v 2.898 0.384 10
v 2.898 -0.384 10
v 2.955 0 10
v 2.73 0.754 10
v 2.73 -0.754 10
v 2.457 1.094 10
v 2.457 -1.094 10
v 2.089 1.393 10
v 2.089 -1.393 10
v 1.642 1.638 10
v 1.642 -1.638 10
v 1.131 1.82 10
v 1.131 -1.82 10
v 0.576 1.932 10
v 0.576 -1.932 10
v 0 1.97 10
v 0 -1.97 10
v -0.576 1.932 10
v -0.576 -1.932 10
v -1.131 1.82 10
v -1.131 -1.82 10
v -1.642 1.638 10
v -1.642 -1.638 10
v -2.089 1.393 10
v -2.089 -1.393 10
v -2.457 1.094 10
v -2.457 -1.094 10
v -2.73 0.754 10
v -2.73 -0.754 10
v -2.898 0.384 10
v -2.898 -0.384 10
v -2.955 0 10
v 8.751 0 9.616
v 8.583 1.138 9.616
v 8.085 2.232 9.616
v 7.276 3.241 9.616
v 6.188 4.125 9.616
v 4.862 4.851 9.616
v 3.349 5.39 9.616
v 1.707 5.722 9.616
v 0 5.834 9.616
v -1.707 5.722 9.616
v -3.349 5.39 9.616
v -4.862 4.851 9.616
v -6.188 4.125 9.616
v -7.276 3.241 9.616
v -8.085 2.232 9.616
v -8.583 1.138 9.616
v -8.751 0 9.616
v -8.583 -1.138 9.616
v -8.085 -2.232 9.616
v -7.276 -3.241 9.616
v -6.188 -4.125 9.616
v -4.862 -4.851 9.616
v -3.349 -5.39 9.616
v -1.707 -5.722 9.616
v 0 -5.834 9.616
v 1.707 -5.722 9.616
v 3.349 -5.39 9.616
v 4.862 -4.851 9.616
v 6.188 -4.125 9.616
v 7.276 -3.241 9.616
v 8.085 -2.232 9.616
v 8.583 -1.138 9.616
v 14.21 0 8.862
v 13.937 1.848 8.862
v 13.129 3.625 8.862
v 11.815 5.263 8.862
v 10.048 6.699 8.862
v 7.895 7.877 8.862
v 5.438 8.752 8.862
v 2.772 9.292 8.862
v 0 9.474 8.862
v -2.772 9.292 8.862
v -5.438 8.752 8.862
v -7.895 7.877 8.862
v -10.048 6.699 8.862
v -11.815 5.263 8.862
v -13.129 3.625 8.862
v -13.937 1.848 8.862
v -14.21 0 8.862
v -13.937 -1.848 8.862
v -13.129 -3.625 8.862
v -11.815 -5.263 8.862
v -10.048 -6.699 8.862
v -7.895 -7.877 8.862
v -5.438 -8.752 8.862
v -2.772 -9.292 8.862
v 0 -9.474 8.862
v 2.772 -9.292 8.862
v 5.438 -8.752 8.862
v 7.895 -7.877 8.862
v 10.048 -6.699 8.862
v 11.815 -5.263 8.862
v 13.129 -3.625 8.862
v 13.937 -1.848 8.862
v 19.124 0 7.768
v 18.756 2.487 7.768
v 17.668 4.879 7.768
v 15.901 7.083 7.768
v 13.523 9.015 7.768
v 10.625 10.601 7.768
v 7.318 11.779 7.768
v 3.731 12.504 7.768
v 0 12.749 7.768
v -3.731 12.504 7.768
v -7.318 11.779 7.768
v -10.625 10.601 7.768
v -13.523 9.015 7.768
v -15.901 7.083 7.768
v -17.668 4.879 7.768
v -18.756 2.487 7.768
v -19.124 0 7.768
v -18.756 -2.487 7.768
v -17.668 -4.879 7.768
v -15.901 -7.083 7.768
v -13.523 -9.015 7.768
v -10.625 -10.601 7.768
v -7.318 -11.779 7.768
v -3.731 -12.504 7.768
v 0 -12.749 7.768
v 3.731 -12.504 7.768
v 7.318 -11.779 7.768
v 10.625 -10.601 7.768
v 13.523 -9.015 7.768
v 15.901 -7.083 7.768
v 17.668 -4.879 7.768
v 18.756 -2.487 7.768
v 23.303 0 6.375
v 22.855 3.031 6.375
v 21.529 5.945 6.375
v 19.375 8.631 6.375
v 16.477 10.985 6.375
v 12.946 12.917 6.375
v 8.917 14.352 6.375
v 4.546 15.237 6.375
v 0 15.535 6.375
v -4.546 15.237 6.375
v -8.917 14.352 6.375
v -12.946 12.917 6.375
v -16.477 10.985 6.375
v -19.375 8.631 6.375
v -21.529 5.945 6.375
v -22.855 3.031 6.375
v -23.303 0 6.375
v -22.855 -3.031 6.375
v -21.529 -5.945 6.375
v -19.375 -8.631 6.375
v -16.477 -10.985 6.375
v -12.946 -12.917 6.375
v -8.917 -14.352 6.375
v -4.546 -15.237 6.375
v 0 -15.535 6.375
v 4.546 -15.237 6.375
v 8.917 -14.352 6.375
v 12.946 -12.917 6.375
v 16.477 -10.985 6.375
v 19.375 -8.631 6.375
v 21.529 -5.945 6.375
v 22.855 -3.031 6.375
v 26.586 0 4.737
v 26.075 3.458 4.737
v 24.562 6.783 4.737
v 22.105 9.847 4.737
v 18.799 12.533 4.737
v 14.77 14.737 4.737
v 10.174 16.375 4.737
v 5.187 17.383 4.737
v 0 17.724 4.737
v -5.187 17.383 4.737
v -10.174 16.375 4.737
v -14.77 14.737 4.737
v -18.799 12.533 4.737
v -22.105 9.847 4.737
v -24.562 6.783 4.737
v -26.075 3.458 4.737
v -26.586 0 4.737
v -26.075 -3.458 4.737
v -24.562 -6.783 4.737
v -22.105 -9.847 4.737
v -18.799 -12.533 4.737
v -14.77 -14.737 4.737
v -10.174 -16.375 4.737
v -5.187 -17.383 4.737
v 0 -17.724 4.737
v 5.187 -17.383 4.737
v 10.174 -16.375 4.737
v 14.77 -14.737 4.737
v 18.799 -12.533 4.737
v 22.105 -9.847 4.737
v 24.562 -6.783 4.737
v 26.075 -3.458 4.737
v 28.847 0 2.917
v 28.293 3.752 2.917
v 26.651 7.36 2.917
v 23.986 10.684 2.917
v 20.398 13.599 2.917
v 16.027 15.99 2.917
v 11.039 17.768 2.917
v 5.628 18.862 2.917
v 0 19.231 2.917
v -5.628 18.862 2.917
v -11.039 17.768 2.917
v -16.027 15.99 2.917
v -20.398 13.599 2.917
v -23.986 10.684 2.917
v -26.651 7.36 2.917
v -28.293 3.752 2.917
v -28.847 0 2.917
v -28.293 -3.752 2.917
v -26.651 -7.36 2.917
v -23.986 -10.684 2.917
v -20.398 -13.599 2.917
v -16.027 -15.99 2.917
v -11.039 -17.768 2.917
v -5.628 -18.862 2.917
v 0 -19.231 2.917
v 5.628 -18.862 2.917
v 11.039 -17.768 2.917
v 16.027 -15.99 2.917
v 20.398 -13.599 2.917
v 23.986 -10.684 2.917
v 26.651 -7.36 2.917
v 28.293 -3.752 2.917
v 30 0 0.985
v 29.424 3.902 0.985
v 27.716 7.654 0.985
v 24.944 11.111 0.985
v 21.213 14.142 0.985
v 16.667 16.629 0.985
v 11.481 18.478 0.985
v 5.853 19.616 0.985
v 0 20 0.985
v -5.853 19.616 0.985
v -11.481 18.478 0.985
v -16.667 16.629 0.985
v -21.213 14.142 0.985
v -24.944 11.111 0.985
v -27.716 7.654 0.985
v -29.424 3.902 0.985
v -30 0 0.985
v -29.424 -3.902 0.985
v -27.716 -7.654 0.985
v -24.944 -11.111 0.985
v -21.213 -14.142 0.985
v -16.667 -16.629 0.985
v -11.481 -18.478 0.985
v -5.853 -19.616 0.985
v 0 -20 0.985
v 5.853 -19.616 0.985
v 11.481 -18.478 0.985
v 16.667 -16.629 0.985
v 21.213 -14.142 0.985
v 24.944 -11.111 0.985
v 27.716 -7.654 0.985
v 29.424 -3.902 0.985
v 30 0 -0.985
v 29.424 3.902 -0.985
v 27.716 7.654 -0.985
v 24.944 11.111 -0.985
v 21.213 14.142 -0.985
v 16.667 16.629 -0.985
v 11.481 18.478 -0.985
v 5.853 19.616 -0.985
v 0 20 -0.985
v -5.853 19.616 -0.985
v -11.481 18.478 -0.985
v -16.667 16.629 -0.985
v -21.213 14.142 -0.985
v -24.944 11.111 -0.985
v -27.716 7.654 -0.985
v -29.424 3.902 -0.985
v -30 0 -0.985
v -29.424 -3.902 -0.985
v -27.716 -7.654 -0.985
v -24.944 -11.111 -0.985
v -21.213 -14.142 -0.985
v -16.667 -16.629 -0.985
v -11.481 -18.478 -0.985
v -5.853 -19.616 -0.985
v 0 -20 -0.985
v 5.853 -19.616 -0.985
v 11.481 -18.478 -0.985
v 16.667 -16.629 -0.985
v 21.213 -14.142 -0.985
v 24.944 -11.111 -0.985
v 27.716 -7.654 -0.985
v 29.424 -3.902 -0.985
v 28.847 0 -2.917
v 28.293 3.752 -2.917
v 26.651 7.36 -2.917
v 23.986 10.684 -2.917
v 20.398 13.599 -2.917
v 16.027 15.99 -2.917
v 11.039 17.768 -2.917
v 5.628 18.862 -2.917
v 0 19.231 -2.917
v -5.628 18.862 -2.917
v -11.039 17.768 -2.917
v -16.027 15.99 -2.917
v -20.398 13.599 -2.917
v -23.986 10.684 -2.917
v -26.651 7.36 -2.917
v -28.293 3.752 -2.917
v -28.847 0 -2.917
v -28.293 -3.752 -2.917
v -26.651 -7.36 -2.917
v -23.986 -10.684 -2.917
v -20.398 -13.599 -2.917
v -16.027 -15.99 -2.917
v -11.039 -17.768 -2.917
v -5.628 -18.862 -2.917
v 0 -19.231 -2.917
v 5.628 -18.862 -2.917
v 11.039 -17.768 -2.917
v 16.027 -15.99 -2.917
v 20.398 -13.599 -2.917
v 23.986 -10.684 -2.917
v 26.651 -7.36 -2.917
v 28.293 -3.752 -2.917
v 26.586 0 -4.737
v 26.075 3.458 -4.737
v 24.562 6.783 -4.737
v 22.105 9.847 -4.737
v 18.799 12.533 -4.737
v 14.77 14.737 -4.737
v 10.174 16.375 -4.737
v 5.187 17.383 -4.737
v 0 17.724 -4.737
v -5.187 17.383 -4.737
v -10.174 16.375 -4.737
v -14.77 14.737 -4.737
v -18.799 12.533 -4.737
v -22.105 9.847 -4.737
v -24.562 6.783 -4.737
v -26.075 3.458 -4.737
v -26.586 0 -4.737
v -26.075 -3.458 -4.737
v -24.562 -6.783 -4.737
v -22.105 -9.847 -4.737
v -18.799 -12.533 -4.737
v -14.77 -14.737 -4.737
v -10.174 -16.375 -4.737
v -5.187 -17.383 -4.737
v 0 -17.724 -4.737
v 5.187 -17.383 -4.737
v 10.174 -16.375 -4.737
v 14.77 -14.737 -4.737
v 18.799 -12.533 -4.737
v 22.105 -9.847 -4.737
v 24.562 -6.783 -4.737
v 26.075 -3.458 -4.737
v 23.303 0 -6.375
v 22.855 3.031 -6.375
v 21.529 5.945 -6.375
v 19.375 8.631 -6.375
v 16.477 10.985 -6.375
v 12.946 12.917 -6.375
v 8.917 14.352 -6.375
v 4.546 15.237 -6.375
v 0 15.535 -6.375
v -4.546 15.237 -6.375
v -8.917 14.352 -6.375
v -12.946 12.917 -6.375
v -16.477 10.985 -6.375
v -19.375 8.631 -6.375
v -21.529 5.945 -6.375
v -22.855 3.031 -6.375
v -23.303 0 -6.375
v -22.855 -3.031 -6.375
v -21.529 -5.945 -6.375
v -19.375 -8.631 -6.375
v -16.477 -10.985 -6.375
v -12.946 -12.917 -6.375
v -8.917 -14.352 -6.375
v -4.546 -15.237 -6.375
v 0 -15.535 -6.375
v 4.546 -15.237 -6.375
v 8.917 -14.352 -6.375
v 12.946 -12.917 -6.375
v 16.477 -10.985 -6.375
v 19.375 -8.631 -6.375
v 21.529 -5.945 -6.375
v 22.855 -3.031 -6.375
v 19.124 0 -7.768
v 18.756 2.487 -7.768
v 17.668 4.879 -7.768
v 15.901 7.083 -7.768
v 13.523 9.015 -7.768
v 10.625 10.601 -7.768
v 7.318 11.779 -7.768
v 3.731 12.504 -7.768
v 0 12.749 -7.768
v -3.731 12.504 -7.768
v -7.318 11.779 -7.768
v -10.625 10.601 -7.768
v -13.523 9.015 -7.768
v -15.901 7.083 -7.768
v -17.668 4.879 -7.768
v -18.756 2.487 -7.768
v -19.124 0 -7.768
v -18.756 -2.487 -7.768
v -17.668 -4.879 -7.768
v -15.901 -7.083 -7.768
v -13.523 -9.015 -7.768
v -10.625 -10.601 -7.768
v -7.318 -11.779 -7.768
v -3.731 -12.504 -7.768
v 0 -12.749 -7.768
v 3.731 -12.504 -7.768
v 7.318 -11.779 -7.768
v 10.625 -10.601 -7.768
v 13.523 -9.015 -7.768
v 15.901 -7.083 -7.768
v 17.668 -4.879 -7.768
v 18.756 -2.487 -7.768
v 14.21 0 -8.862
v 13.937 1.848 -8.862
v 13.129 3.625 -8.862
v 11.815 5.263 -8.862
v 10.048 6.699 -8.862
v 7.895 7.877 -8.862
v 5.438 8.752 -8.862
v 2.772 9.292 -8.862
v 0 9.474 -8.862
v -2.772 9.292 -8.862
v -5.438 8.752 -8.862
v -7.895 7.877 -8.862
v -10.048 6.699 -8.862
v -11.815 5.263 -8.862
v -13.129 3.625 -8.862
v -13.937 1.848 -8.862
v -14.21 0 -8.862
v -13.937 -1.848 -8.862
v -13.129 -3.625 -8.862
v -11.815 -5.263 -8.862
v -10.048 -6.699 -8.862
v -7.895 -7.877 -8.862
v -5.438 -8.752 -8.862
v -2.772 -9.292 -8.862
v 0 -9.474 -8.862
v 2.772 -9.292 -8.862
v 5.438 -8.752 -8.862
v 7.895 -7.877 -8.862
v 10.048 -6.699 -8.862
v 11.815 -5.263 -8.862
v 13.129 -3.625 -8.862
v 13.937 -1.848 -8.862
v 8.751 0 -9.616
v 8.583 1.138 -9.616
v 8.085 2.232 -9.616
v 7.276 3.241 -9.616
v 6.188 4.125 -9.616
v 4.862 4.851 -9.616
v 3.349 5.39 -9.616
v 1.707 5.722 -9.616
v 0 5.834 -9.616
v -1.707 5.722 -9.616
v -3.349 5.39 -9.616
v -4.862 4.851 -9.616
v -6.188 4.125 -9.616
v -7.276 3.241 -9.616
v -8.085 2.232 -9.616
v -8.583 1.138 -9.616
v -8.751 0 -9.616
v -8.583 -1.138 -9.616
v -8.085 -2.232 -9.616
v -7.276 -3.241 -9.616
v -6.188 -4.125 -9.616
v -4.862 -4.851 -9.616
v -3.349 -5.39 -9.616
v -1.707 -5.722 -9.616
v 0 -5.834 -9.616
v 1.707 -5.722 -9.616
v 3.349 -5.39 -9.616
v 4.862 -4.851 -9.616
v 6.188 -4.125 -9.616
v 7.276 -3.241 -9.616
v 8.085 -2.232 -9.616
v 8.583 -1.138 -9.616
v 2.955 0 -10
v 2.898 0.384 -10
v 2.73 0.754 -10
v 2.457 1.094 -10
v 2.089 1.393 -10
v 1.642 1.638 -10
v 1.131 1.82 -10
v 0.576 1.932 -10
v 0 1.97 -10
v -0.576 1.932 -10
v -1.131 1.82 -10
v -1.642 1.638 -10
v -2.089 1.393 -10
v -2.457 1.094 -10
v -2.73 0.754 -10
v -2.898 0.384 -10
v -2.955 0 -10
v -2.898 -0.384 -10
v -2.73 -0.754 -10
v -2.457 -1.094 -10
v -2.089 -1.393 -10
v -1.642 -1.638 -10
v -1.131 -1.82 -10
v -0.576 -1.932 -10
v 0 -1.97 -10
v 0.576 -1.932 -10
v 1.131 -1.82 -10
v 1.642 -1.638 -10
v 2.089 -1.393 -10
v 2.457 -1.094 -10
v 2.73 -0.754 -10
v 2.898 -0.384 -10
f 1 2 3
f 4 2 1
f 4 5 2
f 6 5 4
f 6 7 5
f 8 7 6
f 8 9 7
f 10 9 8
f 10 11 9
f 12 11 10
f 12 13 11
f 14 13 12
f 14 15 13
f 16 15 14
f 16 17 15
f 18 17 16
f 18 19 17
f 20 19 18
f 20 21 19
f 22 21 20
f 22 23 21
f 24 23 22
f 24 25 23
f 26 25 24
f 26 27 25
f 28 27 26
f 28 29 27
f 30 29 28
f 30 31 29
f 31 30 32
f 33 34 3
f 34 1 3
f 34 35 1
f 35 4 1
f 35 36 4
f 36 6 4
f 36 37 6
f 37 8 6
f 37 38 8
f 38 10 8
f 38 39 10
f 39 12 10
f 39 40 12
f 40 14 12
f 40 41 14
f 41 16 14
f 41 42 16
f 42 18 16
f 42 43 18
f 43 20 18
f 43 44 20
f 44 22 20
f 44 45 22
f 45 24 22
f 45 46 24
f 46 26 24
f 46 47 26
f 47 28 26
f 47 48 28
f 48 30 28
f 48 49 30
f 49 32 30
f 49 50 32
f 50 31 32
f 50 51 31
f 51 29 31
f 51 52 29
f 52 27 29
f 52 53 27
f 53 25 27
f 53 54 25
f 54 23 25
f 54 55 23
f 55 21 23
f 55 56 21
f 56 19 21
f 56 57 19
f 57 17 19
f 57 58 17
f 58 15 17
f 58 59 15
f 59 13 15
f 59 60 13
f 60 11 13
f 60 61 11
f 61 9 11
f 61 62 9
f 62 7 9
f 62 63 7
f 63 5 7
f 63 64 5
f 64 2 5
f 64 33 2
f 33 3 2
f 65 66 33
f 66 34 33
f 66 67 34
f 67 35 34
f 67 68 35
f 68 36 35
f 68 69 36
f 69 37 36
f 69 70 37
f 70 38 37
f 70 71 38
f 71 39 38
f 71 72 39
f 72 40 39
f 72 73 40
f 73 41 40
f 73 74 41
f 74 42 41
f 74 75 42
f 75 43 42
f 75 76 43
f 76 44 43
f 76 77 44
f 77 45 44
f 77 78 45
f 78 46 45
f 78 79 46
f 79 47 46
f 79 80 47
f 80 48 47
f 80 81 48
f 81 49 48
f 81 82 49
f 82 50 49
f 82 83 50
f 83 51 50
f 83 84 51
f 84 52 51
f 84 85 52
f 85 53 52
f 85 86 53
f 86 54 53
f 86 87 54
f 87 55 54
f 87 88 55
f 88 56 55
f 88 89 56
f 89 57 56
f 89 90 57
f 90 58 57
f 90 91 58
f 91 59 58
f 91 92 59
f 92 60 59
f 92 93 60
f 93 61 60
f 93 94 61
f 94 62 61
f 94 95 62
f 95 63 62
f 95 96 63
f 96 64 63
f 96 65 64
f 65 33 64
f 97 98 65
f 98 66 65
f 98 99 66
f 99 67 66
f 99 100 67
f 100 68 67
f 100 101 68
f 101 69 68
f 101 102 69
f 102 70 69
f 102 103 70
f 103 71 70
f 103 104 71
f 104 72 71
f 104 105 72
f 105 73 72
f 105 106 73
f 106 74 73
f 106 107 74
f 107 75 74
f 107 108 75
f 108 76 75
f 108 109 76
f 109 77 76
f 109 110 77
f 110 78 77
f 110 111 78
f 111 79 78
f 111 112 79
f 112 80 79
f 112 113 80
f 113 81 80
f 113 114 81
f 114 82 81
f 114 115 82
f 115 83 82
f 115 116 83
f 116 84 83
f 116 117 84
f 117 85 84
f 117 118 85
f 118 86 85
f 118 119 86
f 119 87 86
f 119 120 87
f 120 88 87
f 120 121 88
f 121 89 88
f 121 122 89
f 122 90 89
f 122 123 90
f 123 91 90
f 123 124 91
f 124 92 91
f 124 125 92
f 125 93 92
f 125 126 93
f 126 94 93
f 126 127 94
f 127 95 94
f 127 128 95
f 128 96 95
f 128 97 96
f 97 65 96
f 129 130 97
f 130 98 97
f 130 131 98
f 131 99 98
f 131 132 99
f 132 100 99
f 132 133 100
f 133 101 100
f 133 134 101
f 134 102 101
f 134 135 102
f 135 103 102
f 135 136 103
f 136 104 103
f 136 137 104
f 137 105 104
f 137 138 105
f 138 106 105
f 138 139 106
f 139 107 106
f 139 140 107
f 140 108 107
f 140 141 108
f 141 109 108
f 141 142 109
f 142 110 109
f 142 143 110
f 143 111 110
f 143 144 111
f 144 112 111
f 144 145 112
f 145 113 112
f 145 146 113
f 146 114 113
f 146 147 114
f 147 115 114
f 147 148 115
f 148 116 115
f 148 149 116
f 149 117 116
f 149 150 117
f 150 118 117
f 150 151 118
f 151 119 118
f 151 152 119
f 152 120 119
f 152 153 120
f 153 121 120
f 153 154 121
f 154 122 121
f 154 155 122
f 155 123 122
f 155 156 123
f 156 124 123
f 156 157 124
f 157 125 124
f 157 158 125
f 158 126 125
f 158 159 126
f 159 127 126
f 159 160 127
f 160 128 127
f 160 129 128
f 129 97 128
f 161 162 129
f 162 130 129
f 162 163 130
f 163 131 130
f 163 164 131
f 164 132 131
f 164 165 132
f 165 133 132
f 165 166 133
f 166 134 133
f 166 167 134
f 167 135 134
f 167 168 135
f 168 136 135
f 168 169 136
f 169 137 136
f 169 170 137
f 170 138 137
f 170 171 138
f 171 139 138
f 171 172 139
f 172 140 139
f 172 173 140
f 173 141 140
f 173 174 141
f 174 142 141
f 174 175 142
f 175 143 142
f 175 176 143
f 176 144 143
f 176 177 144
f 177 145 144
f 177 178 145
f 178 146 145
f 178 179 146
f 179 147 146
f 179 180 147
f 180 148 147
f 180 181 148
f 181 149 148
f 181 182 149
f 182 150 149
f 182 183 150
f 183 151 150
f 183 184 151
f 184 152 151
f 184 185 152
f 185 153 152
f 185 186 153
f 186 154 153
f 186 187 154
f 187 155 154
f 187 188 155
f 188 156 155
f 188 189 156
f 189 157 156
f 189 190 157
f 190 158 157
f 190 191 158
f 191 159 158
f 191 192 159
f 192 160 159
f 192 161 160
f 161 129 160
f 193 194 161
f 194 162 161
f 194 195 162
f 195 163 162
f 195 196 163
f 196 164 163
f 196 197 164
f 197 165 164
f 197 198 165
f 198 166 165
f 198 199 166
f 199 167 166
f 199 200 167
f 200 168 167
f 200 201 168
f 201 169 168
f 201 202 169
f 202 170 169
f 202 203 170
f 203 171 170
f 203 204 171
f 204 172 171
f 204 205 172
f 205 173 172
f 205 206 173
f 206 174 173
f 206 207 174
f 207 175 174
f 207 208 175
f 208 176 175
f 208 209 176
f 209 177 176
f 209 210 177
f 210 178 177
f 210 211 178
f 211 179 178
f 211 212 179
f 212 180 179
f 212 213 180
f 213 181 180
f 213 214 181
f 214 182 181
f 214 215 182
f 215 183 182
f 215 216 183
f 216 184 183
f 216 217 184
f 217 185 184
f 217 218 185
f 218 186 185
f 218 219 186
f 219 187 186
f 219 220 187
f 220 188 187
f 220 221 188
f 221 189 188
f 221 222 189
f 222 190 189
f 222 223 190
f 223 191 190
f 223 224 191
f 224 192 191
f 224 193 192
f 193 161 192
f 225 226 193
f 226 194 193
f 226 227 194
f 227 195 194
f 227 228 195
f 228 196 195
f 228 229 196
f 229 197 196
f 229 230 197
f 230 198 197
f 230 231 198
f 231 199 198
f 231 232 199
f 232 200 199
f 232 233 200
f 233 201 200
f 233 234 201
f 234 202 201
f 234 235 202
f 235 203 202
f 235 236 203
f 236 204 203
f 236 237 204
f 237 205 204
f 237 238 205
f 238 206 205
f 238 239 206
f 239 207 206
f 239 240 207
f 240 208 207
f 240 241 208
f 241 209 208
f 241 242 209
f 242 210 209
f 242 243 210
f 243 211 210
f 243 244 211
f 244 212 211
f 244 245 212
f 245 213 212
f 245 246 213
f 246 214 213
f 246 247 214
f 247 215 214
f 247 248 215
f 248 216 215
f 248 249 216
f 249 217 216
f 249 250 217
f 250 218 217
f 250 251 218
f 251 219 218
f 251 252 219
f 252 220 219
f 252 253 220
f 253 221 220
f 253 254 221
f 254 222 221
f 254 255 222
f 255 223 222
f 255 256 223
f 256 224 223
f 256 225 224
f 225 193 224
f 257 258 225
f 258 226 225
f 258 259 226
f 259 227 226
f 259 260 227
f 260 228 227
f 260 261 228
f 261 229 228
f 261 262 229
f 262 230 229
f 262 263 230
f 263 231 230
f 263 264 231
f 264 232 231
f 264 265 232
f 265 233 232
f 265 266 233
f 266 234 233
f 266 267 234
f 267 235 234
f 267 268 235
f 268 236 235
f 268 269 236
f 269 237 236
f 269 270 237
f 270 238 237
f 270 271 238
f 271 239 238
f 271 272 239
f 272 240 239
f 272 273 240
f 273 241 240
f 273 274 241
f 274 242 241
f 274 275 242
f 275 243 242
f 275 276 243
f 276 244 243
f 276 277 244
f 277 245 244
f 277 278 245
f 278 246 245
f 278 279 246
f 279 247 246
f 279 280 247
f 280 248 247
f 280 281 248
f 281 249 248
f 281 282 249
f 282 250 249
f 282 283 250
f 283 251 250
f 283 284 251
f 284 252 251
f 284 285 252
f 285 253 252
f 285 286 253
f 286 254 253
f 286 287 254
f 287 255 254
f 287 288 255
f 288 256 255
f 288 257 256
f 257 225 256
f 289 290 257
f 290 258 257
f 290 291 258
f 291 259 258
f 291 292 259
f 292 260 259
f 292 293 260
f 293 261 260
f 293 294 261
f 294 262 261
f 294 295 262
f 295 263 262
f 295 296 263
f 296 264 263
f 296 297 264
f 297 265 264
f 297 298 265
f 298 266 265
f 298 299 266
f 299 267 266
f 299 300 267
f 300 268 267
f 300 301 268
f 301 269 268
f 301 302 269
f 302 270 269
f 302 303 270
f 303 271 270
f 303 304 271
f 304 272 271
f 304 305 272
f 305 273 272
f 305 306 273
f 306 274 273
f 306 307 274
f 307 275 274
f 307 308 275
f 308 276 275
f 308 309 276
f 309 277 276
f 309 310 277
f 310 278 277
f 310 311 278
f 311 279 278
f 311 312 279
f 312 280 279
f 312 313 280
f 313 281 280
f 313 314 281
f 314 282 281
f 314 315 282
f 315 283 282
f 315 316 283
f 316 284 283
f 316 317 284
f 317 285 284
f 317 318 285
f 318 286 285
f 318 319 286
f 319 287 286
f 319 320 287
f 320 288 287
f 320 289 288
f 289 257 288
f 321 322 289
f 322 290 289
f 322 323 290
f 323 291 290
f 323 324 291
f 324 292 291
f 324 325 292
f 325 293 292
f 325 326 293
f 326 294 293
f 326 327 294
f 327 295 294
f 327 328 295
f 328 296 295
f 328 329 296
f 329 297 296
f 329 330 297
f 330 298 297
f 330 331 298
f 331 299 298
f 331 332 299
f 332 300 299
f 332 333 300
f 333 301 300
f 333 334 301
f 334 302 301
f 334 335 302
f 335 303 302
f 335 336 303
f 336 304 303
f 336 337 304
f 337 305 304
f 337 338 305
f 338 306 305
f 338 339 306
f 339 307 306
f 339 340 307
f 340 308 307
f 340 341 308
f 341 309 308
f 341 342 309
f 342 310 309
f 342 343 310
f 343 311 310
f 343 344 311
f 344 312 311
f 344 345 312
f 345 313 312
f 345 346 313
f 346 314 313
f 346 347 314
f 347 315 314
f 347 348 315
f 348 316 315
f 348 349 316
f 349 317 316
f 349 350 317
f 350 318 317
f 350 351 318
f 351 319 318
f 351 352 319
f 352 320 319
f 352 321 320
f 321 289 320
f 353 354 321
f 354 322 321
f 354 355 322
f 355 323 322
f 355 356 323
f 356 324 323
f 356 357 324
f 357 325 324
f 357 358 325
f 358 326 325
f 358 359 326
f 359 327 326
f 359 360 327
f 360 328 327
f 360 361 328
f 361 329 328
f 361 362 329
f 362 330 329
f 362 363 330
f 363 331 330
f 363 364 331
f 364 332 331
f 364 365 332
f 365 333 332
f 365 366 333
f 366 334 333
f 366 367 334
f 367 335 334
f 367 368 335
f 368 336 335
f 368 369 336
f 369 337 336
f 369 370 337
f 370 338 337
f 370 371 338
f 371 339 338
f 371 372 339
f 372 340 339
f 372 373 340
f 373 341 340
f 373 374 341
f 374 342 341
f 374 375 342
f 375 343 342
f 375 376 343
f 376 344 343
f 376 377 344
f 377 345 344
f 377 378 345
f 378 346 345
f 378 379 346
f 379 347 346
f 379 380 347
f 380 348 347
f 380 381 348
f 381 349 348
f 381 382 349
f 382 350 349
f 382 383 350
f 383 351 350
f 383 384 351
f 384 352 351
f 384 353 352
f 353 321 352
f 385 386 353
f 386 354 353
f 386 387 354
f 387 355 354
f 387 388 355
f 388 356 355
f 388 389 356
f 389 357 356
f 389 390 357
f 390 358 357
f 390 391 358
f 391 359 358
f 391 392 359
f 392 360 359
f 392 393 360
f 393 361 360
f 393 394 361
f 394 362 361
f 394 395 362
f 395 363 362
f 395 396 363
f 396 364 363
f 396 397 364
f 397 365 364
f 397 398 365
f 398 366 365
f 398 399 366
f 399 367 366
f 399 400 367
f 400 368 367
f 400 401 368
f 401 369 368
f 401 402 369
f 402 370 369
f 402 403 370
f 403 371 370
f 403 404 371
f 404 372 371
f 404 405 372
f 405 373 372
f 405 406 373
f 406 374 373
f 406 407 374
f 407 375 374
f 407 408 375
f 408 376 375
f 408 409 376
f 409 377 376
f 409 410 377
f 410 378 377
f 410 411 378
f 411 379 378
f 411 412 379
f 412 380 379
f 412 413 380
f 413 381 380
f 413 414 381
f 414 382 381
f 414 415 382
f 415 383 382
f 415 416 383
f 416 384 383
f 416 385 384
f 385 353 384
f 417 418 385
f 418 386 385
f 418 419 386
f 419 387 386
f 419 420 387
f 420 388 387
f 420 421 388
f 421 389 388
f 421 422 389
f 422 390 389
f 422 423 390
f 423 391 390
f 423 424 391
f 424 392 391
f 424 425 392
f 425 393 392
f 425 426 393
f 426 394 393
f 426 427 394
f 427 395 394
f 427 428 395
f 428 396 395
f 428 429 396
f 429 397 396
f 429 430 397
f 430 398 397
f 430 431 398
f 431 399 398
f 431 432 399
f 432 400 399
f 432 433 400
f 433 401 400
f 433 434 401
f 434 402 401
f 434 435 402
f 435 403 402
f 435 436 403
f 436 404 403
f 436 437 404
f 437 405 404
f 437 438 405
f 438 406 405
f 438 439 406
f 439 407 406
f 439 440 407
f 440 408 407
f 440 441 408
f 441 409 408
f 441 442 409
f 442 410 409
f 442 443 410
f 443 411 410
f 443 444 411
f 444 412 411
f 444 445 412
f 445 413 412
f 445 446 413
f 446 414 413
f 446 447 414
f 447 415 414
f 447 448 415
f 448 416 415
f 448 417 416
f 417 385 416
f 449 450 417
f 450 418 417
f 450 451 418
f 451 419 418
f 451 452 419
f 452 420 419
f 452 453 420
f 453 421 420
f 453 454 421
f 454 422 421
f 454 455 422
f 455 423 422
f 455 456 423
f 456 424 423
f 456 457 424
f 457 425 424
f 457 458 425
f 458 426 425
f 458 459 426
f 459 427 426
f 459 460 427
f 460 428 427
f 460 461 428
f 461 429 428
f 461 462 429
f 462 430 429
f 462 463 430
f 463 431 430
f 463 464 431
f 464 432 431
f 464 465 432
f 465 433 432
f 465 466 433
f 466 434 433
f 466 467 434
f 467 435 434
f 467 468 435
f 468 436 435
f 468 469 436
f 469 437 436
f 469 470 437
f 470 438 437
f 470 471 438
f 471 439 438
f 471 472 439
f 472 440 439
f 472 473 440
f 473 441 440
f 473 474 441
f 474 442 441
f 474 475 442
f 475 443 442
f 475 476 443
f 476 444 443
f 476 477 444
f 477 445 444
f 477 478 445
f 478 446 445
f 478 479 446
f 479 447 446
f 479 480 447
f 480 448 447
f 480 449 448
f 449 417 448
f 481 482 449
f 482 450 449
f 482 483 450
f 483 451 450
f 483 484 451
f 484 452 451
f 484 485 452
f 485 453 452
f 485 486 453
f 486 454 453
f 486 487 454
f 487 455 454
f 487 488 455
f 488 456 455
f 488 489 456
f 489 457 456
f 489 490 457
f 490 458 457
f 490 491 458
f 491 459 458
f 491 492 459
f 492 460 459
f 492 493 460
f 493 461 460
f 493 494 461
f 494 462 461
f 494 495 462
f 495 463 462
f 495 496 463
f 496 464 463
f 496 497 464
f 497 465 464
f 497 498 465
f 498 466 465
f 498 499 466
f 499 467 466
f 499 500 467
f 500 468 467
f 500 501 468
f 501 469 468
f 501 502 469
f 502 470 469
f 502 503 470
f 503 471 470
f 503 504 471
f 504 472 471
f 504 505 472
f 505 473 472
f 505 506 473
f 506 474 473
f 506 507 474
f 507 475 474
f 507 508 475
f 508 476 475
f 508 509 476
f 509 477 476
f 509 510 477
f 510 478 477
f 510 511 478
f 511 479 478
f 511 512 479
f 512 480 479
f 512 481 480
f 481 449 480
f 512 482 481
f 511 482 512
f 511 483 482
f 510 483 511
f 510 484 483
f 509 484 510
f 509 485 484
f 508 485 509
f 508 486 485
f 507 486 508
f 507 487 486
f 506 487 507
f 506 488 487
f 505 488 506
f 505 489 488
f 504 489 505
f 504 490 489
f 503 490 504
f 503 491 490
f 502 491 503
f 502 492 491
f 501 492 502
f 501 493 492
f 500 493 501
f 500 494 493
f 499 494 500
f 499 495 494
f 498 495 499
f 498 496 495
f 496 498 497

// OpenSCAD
// Unit of length: Unit.MM
resize(newsize = [60.0, 40.0, 20.0], auto = [false, false, false])
{
   sphere(d = 60.0, $fn = 32);
}
